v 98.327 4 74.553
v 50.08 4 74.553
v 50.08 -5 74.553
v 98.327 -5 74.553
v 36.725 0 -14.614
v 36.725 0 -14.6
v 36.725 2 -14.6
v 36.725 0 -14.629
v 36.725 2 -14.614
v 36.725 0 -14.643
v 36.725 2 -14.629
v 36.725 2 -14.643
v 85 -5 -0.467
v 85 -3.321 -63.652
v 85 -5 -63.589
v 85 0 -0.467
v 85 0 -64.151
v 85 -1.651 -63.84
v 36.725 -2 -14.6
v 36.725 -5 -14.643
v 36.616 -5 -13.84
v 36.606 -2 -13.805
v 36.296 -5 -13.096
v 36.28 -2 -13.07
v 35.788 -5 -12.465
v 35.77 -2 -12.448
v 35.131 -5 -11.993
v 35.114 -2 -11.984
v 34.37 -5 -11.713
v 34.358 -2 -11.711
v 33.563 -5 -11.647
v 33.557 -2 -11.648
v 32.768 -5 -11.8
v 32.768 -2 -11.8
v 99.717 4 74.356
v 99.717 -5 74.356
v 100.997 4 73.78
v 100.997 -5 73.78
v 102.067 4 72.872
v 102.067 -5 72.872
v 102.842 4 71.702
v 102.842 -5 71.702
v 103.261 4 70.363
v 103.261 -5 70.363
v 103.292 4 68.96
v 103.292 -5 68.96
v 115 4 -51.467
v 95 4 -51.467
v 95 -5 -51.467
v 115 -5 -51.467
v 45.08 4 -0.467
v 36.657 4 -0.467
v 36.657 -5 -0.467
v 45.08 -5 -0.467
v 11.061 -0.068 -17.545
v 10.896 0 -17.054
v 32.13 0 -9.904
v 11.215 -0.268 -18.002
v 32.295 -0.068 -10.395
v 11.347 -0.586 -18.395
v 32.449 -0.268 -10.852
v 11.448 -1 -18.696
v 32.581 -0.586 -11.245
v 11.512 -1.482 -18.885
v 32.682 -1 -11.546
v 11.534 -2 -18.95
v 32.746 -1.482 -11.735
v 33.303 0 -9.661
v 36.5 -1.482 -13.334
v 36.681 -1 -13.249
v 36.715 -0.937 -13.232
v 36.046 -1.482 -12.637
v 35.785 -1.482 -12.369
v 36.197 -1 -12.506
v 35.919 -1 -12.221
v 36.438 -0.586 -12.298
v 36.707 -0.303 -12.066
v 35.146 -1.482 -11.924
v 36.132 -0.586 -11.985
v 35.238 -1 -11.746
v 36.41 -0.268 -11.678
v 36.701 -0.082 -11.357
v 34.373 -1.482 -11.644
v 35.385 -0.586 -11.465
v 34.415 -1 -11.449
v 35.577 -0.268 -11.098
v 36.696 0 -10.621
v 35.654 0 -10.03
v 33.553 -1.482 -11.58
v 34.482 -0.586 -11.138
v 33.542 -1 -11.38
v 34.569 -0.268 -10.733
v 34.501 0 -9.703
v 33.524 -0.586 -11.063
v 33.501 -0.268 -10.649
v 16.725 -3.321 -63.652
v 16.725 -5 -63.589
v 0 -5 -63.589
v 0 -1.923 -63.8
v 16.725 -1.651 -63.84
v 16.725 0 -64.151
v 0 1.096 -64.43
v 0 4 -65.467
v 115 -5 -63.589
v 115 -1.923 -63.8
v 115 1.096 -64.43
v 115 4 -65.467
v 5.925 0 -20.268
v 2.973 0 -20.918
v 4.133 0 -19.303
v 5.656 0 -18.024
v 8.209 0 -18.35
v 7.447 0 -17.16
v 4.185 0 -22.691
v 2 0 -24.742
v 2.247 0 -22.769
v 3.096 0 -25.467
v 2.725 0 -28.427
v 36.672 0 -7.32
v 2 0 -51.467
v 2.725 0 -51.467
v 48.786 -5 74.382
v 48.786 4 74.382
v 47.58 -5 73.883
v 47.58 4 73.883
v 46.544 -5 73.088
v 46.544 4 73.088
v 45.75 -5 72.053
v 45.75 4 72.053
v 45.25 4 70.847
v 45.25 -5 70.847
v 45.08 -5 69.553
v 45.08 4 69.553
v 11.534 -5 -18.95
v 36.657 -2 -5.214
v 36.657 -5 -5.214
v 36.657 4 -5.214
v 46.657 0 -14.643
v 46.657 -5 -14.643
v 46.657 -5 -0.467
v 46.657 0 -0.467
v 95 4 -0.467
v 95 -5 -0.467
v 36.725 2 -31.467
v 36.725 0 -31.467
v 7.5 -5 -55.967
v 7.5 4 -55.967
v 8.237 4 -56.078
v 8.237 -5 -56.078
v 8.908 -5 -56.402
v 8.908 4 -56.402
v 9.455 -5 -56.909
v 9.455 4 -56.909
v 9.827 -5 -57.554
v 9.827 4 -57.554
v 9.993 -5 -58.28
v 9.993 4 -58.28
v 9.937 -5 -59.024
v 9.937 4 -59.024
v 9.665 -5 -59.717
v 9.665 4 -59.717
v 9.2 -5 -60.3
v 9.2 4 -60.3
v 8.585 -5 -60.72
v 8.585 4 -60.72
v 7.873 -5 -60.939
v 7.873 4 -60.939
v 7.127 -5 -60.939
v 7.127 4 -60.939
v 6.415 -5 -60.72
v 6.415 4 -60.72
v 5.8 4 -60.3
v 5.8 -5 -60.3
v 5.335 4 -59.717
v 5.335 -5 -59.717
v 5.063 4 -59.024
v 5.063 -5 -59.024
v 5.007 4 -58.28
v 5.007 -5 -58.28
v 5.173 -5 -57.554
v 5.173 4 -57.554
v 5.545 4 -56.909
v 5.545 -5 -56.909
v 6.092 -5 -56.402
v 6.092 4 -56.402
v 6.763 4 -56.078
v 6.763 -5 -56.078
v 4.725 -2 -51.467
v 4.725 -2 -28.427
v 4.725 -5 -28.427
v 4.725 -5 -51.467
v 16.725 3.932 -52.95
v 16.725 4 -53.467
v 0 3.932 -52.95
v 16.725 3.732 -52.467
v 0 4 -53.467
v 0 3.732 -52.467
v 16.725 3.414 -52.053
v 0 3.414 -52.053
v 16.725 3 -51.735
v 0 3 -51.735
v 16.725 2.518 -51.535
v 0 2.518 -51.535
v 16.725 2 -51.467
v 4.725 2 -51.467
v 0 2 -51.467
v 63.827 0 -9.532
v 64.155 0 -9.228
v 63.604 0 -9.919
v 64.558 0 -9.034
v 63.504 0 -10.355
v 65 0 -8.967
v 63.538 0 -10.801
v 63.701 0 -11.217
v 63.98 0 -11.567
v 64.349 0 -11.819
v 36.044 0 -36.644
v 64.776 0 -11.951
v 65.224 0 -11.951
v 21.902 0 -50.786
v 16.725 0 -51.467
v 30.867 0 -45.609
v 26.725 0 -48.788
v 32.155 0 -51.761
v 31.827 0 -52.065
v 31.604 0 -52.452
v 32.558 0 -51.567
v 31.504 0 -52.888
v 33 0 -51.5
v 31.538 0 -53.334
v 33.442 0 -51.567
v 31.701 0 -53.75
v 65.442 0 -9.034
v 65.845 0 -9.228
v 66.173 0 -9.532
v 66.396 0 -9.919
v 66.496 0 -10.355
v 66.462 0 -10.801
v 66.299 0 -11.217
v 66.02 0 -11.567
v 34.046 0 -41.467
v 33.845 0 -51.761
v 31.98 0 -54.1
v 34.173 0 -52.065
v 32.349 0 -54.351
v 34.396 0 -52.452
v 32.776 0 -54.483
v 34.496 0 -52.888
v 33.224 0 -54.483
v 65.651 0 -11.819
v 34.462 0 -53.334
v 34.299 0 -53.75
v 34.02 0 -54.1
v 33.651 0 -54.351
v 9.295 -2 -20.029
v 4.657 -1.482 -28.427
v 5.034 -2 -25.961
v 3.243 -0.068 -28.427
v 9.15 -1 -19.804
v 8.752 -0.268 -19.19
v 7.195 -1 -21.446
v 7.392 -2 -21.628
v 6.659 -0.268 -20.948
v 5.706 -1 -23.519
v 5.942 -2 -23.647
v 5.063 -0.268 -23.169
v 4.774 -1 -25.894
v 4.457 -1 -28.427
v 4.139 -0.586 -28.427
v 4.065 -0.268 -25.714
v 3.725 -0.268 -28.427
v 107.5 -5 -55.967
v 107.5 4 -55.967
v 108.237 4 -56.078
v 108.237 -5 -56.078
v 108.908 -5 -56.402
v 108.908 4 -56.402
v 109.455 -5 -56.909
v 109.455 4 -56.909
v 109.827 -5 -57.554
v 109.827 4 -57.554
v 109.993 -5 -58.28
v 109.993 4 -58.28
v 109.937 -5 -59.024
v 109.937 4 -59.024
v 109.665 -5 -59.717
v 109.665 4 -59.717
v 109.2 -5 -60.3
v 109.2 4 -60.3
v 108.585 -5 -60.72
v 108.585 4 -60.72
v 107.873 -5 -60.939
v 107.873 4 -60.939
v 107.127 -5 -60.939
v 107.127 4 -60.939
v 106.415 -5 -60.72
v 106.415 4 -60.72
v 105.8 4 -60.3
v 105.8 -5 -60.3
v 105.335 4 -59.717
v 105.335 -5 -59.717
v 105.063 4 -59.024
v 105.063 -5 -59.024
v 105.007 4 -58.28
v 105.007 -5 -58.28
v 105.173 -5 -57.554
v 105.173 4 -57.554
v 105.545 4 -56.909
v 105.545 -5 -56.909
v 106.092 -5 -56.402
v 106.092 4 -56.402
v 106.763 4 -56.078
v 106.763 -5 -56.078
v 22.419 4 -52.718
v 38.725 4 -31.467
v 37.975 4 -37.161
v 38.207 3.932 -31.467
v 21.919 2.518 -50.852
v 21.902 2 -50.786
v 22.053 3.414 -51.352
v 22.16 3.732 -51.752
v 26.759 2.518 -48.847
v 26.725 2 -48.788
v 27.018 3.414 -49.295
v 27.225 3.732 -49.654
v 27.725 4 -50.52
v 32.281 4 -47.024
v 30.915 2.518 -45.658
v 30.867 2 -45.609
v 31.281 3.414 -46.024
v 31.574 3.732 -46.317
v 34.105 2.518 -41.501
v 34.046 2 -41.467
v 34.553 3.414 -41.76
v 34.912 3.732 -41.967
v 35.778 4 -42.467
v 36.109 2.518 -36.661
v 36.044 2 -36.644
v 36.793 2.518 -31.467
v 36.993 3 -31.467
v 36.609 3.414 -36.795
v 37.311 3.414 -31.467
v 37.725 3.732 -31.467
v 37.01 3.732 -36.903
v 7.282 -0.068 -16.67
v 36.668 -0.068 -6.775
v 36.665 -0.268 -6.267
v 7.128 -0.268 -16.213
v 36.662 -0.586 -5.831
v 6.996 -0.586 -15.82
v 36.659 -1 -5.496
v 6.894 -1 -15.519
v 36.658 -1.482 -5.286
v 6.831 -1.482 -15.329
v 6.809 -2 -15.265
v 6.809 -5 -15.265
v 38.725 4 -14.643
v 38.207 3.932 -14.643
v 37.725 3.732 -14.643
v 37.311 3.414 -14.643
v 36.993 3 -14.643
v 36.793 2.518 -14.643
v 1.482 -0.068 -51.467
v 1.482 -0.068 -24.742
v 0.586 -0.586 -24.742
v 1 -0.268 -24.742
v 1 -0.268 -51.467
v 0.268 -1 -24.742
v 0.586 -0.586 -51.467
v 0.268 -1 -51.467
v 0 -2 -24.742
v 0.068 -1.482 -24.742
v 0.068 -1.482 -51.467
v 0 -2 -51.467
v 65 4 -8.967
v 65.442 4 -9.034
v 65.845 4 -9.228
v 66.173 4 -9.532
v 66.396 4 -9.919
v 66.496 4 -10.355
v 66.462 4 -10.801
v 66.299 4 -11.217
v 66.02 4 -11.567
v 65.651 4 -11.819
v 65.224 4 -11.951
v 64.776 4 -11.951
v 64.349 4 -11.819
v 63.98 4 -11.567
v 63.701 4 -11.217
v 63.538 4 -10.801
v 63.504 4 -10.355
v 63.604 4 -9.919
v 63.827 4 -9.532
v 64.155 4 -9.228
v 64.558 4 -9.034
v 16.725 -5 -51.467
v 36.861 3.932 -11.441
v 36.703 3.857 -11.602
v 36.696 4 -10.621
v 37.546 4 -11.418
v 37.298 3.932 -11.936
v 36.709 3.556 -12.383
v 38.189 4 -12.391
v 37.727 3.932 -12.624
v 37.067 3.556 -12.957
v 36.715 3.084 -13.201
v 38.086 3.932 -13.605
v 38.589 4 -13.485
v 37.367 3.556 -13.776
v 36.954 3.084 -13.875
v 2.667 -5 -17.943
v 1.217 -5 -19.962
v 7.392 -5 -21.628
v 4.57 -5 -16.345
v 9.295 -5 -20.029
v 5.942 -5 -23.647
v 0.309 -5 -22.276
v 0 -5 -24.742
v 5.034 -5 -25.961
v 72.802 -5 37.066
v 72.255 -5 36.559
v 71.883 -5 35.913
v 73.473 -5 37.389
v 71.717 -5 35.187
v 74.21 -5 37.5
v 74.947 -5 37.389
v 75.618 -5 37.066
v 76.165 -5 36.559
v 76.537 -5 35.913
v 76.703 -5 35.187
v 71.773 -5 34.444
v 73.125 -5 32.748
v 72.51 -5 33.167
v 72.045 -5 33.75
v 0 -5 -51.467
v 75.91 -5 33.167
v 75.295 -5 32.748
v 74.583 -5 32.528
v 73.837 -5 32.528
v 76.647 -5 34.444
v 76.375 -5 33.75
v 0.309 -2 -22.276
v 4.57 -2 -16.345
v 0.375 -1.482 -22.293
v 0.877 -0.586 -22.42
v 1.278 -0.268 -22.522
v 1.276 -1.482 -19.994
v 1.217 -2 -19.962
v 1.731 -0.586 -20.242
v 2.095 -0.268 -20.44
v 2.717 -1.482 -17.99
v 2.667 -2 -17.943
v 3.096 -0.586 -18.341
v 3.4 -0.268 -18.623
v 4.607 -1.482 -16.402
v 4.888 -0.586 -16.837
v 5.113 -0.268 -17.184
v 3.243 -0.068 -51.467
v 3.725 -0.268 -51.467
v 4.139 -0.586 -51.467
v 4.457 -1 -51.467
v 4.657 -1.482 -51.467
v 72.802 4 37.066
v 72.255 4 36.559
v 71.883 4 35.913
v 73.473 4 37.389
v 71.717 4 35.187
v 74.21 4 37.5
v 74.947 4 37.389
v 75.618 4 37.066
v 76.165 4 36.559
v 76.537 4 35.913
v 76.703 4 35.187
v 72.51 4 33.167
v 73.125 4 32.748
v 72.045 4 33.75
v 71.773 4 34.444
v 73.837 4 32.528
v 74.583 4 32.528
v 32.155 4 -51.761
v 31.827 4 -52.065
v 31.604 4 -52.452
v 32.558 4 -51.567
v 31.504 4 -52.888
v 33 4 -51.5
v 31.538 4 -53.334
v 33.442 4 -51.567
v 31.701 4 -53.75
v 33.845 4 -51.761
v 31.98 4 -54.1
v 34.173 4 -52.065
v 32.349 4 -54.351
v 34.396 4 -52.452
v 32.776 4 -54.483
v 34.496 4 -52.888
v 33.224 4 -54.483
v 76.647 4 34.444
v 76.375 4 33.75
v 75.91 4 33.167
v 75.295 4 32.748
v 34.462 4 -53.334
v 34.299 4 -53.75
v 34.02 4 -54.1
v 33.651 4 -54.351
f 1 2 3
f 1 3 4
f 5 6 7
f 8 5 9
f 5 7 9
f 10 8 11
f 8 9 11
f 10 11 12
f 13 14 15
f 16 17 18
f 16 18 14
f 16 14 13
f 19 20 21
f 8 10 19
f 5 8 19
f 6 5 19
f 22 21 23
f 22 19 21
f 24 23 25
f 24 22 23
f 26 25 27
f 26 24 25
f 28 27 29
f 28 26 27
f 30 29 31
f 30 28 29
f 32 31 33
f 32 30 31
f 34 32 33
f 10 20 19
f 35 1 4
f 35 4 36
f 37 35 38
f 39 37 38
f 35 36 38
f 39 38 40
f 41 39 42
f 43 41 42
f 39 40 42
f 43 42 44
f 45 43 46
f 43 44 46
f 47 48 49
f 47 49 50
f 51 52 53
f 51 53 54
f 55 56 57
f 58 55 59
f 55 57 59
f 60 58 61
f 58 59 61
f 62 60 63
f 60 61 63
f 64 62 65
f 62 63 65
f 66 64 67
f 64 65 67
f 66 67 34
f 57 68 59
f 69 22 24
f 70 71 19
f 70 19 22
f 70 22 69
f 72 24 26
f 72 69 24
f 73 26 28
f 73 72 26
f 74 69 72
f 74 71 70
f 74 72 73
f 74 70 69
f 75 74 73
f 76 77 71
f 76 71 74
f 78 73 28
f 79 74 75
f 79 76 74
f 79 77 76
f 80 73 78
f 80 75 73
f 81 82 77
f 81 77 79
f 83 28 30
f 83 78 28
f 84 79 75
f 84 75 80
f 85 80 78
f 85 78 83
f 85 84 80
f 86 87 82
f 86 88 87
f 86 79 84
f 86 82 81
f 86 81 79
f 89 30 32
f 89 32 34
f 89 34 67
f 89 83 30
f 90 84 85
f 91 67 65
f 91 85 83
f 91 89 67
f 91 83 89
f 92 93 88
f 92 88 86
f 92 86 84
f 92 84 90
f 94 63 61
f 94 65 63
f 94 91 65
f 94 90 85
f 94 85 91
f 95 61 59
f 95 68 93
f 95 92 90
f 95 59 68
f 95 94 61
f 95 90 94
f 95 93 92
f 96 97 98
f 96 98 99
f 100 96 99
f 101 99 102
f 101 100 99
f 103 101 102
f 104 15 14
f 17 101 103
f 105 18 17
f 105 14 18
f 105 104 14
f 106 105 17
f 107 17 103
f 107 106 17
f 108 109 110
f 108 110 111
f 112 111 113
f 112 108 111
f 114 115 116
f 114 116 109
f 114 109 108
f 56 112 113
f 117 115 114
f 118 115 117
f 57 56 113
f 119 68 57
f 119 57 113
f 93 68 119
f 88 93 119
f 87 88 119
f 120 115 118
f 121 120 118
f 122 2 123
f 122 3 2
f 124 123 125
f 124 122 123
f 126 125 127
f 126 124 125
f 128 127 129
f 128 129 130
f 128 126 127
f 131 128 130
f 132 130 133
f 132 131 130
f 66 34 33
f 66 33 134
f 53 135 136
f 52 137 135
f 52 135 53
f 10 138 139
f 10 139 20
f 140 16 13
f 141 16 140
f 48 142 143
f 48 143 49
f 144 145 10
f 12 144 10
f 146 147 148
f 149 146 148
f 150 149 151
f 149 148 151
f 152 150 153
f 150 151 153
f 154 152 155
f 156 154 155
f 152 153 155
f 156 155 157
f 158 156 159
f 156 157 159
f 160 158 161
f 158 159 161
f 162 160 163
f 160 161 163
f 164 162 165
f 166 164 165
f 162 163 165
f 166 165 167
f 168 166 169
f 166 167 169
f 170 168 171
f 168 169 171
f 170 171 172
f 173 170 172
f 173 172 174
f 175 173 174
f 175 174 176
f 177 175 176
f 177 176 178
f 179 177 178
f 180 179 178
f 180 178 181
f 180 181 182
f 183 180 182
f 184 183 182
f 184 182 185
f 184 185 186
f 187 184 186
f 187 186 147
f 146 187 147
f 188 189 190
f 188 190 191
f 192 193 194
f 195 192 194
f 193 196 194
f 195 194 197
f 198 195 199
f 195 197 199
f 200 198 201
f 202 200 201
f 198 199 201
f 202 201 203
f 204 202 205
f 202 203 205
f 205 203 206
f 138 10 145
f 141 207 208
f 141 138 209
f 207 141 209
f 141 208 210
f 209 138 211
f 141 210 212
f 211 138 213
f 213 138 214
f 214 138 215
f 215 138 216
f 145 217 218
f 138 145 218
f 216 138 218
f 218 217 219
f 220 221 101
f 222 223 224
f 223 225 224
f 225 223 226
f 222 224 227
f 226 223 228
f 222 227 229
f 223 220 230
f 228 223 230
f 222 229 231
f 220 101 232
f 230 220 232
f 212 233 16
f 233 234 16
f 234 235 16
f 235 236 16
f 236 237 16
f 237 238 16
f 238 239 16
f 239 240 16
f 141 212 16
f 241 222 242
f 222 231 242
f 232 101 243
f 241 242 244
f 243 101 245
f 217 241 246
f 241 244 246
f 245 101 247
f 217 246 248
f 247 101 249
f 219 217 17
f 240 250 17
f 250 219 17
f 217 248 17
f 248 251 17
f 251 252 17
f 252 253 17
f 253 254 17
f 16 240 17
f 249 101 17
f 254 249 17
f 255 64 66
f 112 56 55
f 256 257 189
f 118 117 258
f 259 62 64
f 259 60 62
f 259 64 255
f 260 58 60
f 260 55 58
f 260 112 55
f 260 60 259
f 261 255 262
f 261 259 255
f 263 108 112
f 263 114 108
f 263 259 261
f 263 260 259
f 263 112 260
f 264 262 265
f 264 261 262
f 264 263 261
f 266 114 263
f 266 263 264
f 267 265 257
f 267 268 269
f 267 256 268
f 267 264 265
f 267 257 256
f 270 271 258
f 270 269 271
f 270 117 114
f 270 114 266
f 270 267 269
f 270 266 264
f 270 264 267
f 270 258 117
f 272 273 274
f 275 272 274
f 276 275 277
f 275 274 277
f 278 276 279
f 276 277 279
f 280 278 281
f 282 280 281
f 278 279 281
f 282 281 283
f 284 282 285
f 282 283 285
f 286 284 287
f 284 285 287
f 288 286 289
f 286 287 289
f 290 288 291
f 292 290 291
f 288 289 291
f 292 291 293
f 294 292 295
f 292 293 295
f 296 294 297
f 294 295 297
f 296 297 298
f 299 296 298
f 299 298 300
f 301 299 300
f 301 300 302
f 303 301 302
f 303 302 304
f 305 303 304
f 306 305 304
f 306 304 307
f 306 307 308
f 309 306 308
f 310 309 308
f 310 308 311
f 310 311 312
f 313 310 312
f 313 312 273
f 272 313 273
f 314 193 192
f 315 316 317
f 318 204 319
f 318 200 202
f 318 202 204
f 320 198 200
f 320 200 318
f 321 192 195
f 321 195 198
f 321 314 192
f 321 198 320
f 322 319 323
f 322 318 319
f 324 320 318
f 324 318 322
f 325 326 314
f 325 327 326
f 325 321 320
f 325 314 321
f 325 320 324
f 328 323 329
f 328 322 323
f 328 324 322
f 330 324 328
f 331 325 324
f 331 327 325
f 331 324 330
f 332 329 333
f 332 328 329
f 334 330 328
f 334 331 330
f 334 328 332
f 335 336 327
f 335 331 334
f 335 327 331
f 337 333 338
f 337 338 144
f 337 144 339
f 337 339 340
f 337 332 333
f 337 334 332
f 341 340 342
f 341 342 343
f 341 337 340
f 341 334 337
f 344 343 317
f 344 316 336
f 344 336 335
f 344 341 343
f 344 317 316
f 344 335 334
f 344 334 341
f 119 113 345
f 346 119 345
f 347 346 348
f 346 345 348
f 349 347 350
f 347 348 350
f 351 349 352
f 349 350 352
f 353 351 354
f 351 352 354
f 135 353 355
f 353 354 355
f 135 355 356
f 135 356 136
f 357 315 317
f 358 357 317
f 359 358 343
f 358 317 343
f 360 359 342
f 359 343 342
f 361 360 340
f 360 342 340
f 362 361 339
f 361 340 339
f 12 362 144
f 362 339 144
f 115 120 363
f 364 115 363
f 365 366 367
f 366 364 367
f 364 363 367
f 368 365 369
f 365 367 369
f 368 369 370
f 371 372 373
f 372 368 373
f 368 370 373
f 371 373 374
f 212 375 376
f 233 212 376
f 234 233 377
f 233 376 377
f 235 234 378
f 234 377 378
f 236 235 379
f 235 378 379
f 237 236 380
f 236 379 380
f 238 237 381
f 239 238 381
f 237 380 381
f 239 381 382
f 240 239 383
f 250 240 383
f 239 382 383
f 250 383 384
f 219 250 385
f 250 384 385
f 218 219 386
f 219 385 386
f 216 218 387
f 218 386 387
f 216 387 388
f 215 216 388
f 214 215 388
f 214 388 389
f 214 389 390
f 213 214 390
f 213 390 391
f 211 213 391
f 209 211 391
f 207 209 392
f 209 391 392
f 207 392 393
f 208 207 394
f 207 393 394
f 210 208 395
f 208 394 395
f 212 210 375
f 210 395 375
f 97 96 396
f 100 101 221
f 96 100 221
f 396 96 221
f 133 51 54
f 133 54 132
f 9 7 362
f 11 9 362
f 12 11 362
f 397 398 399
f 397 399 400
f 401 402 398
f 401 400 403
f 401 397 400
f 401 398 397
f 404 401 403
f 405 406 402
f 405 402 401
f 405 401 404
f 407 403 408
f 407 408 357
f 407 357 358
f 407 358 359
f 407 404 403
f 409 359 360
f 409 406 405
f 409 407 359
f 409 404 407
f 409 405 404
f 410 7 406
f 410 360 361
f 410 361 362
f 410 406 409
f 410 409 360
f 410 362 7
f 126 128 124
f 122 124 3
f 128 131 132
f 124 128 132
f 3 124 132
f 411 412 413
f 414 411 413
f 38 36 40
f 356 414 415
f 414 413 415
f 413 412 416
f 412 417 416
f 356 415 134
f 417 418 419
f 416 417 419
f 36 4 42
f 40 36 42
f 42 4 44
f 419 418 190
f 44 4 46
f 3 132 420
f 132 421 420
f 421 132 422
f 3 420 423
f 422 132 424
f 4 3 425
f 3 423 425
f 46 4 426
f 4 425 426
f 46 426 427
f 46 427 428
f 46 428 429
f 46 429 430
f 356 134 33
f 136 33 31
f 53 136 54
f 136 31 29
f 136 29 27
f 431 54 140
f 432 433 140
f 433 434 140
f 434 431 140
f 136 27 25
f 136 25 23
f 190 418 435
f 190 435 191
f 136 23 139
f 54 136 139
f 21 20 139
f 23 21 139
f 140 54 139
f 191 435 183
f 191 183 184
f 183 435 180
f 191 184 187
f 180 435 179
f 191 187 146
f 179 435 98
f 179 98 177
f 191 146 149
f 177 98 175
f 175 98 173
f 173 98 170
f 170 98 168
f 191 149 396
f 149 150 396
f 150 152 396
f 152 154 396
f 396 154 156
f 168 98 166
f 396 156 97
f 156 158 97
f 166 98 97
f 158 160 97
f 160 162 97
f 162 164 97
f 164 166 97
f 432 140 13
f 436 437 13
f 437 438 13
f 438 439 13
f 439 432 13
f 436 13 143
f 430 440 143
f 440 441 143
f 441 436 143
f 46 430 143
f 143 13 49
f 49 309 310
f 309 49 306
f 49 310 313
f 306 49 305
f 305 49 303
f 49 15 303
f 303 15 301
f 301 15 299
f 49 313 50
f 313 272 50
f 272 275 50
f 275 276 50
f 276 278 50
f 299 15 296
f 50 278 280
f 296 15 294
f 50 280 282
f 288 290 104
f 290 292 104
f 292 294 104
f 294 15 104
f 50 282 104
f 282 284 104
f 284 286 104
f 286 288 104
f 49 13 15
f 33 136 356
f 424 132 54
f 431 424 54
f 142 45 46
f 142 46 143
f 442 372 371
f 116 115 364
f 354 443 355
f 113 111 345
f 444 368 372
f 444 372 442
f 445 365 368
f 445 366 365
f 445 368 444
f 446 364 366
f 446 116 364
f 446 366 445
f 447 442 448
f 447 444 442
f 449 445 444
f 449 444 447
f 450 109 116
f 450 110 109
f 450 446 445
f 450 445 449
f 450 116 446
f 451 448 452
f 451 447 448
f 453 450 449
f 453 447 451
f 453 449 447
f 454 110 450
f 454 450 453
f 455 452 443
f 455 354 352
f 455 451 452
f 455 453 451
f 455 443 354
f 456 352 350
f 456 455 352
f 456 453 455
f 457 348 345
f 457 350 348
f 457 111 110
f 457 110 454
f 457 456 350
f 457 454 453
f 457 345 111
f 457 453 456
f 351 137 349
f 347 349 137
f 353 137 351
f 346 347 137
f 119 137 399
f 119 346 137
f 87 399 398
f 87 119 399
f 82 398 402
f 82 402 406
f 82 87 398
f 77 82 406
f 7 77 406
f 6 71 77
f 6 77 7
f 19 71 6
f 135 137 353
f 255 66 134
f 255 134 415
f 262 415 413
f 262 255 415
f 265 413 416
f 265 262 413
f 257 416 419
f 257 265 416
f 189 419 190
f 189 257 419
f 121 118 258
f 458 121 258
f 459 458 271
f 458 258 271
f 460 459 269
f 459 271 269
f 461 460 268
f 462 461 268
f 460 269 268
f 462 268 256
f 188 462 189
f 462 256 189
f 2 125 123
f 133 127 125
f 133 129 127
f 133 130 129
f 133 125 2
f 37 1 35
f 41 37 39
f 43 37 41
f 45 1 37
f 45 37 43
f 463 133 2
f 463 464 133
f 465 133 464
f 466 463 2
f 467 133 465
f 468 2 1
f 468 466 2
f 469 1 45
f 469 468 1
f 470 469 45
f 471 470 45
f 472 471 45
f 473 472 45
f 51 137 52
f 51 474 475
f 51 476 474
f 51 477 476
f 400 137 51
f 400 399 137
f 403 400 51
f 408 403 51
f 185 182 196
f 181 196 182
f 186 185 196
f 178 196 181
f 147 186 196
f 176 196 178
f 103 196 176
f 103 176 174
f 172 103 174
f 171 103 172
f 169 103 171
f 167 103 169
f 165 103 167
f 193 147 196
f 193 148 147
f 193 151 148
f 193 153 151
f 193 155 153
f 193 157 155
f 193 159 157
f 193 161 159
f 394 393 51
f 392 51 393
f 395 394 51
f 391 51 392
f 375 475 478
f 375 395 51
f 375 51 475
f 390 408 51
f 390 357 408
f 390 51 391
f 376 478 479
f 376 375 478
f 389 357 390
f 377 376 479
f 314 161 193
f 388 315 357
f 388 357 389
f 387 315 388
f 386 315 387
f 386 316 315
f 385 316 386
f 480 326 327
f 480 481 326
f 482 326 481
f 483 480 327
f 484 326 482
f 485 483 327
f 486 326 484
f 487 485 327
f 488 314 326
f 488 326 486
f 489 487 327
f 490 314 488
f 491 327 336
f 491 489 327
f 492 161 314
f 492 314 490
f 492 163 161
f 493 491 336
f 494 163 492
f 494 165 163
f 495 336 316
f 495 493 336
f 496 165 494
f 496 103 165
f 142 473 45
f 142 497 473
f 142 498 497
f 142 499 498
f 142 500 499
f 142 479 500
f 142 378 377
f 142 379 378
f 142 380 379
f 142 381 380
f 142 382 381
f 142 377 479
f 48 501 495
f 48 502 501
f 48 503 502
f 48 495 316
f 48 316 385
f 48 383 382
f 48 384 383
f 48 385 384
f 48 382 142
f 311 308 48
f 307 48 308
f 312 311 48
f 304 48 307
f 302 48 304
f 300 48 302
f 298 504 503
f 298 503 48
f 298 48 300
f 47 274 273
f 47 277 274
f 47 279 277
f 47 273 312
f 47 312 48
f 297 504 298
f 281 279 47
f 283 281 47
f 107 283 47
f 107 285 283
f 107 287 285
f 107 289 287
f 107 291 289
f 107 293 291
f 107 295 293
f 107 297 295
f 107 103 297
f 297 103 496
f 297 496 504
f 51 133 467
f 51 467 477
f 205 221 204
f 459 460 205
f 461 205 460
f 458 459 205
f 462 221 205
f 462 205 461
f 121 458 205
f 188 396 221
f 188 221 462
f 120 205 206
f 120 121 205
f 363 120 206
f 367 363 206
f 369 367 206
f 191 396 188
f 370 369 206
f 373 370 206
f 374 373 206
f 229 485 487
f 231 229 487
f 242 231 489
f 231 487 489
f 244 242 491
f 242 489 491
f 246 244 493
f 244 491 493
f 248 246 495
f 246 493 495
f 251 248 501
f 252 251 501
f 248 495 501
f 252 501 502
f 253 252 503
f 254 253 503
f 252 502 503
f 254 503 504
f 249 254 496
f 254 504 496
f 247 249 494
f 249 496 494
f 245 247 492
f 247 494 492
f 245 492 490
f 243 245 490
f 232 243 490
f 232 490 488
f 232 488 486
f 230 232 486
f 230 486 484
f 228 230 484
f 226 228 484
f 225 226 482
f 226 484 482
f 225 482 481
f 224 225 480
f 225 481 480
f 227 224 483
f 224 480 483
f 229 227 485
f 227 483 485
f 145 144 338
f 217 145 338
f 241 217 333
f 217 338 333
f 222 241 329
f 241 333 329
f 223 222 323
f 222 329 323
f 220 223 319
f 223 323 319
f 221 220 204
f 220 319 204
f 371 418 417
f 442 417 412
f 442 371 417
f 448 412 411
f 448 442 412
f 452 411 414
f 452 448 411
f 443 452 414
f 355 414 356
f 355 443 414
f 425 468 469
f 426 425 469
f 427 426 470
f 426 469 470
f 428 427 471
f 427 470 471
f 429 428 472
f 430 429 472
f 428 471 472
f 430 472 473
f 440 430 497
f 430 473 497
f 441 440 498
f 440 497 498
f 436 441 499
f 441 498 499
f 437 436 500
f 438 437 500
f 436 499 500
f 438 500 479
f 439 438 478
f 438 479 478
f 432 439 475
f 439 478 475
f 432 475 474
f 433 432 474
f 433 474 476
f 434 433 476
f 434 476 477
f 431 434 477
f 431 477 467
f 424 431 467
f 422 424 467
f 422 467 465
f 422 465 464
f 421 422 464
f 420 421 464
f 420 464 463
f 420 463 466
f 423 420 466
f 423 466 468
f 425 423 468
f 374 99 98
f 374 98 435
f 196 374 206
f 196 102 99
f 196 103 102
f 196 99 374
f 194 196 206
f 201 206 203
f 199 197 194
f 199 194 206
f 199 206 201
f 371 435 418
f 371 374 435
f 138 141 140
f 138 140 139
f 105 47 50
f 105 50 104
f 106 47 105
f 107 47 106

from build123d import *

# Parameters (mm, degrees)
SALIENTE_EXTRUIR1_DEPTH      = 4
REDONDEO1_R                  = 20
REDONDEO2_R                  = 10
REDONDEO3_R                  = 3
CROQUIS2_R                   = 1.5
CORTAR_EXTRUIR1_DEPTH        = 4
SALIENTE_EXTRUIR2_DEPTH      = 5
SALIENTE_EXTRUIR2_DEPTH_BACK = 4
CROQUIS4_W                   = 16.725121099
CROQUIS4_H                   = 14
SALIENTE_EXTRUIR3_DEPTH      = 5
SALIENTE_EXTRUIR4_DEPTH      = 5
CORTAR_EXTRUIR2_START        = -4
CORTAR_EXTRUIR2_DEPTH        = 4
SALIENTE_EXTRUIR5_DEPTH      = 9
REDONDEO4_R                  = 5
CORTAR_EXTRUIR3_DEPTH        = 115
CROQUIS10_R                  = 2.5
CORTAR_EXTRUIR4_DEPTH        = 10
REDONDEO5_R                  = 2


with BuildPart() as part:
    # Croquis1 → Saliente-Extruir1 (new body)
    with BuildSketch(Plane(origin=(0, 0, 0), x_dir=(1, 0, 0), z_dir=(0, 1, 0))):
        Polygon((36.657146199, 0.467319271), (95, 0.467319271), (95, 65.467319271), (0, 65.467319271), (0, 17.557539605), (36.657146199, 5.214366653), align=None)
        Polygon((4.725121099, 51.467319271), (36.725121099, 51.467319271), (36.725121099, 10.467319271), (4.725121099, 21.242340663), align=None, mode=Mode.SUBTRACT)
    extrude(amount=SALIENTE_EXTRUIR1_DEPTH)

    # Redondeo1
    redondeo1_edges = [part.edges().sort_by_distance(p)[0] for p in [
        (36.725121099, 2, -51.467319271),
    ]]
    fillet(redondeo1_edges, radius=REDONDEO1_R)

    # Redondeo2
    redondeo2_edges = [part.edges().sort_by_distance(p)[0] for p in [
        (0, 2, -17.557539605),
        (4.725121099, 2, -21.242340663),
    ]]
    fillet(redondeo2_edges, radius=REDONDEO2_R)

    # Redondeo3
    redondeo3_edges = [part.edges().sort_by_distance(p)[0] for p in [
        (36.725121099, 2, -10.467319271),
    ]]
    fillet(redondeo3_edges, radius=REDONDEO3_R)

    # Croquis2 → Cortar-Extruir1 (cut)
    with BuildSketch(Plane(origin=(0, 4, 0), x_dir=(1, 0, 0), z_dir=(0, 1, 0))):
        with Locations(Location((33, 53, 0), (0, 0, 270))):
            Circle(CROQUIS2_R)
        with Locations(Location((65, 10.467319271, 0), (0, 0, 270))):
            Circle(CROQUIS2_R)
    extrude(amount=-CORTAR_EXTRUIR1_DEPTH, mode=Mode.SUBTRACT)

    # Croquis3 → Saliente-Extruir2 (add, two sides: drawn at the far end of the back side and taken through both)
    with BuildSketch(Plane.XZ.offset(-SALIENTE_EXTRUIR2_DEPTH_BACK)):
        Polygon((95, -0.467319271), (95, -51.467319271), (115, -51.467319271), (115, -65.467319271), (85, -65.467319271), (85, -0.467319271), align=None)
    extrude(amount=SALIENTE_EXTRUIR2_DEPTH + SALIENTE_EXTRUIR2_DEPTH_BACK)

    # Croquis4 → Saliente-Extruir3 (add)
    with BuildSketch(Plane.XZ):
        with Locations((8.36256055, -58.467319271)):
            Rectangle(CROQUIS4_W, CROQUIS4_H)
    extrude(amount=SALIENTE_EXTRUIR3_DEPTH)

    # Croquis5 → Saliente-Extruir4 (add)
    with BuildSketch(Plane.XZ):
        with BuildLine():
            Line((6.808855565, -15.264865719), (36.657146199, -5.214366653))
            Line((36.657146199, -5.214366653), (36.657146199, -0.467319271))
            Line((36.657146199, -0.467319271), (46.657146199, -0.467319271))
            Line((46.657146199, -0.467319271), (46.657146199, -14.642982178))
            Line((46.657146199, -14.642982178), (36.725121099, -14.642982178))
            ThreePointArc((36.725121099, -14.642982178), (35.475545335, -12.206588327), (32.767777769, -11.799833616))
            Line((32.767777769, -11.799833616), (11.533976664, -18.949666776))
            ThreePointArc((11.533976664, -18.949666776), (6.603808263, -22.592081199), (4.725121099, -28.426828651))
            Line((4.725121099, -28.426828651), (4.725121099, -51.467319271))
            Line((4.725121099, -51.467319271), (0, -51.467319271))
            Line((0, -51.467319271), (0, -24.742027593))
            ThreePointArc((0, -24.742027593), (1.878687164, -18.907280142), (6.808855565, -15.264865719))
        make_face()
    extrude(amount=SALIENTE_EXTRUIR4_DEPTH)

    # Cortar-Extruir2: read off the stored shape, not the designer's step
    # Cortar-Extruir2 outline → Cortar-Extruir2 (cut)
    with BuildSketch(Plane(origin=(0, 4, 0), x_dir=(1, 0, 0), z_dir=(0, 1, 0)).offset(CORTAR_EXTRUIR2_START)):
        with BuildLine():
            Line((4.725121099, 51.467319271), (0, 51.467319271))
            Line((0, 51.467319271), (0, 24.742027593))
            ThreePointArc((0, 24.742027593), (1.878687164, 18.907280142), (6.808855565, 15.264865719))
            Line((6.808855565, 15.264865719), (36.657146199, 5.214366653))
            Line((36.657146199, 5.214366653), (36.72480926, 14.599727874))
            ThreePointArc((36.72480926, 14.599727874), (35.457935304, 12.194032416), (32.767777769, 11.799833616))
            Line((32.767777769, 11.799833616), (11.533976664, 18.949666776))
            ThreePointArc((11.533976664, 18.949666776), (6.603808263, 22.592081199), (4.725121099, 28.426828651))
            Line((4.725121099, 28.426828651), (4.725121099, 51.467319271))
        make_face()
    extrude(amount=CORTAR_EXTRUIR2_DEPTH, mode=Mode.SUBTRACT)

    # Croquis8 → Saliente-Extruir5 (add)
    with BuildSketch(Plane(origin=(0, 4, 0), x_dir=(1, 0, 0), z_dir=(0, 1, 0))):
        Polygon((45.08, -74.552680729), (103.96, -74.552680729), (95, 0.467319271), (45.08, 0.467319271), align=None)
    extrude(amount=-SALIENTE_EXTRUIR5_DEPTH)

    # Redondeo4
    redondeo4_edges = [part.edges().sort_by_distance(p)[0] for p in [
        (45.08, -0.5, 74.552680729),
        (103.96, -0.5, 74.552680729),
    ]]
    fillet(redondeo4_edges, radius=REDONDEO4_R)

    # Croquis9 → Cortar-Extruir3 (cut)
    with BuildSketch(Plane(origin=(115, 0, 0), x_dir=(0, 0, -1), z_dir=(1, 0, 0))):
        with BuildLine():
            Line((65.467319271, 4), (65.467319271, -5))
            Line((65.467319271, -5), (63.588909898, -5))
            ThreePointArc((63.588909898, -5), (64.063517857, -0.403033017), (65.467319271, 4))
        make_face()
    extrude(amount=-CORTAR_EXTRUIR3_DEPTH, mode=Mode.SUBTRACT)

    # Croquis10 → Cortar-Extruir4 (cut)
    with BuildSketch(Plane(origin=(0, 4, 0), x_dir=(1, 0, 0), z_dir=(0, 1, 0))):
        with Locations(Location((7.5, 58.467319271, 0), (0, 0, 270))):
            Circle(CROQUIS10_R)
        with Locations(Location((107.5, 58.467319271, 0), (0, 0, 270))):
            Circle(CROQUIS10_R)
        with Locations(Location((74.21, -35, 0), (0, 0, 270))):
            Circle(CROQUIS10_R)
    extrude(amount=-CORTAR_EXTRUIR4_DEPTH, mode=Mode.SUBTRACT)

    # Redondeo5
    # the kernel refuses this fillet: 2 mm, written as the material it takes off along each edge
    with BuildSketch(Plane(origin=(6.808855565, 0, -15.264865719), x_dir=(-3.003248393768829e-11, -1.0, 8.919142254990751e-11), z_dir=(0.9477161874303269, 0, 0.31911444355046886))) as redondeo5_piece_1_section:
        with BuildLine():
            CenterArc((REDONDEO5_R, REDONDEO5_R), REDONDEO5_R, 180.000000005, 90)
            Line((-REDONDEO5_R * 9.41119543218e-11, REDONDEO5_R), (0, 0))
            Line((0, 0), (REDONDEO5_R, 0))
        make_face()
    redondeo5_piece_1 = extrude(amount=36.494967618, mode=Mode.PRIVATE)
    redondeo5_piece_1 = split(redondeo5_piece_1, bisect_by=Plane(origin=(36.728049447, 0, -15.049165525), z_dir=(-0.9999740131061556, 0, -0.007209237988178882)), keep=Keep.TOP, mode=Mode.PRIVATE)
    add(redondeo5_piece_1, mode=Mode.SUBTRACT)
    with BuildSketch(Plane(origin=(9.999999999, 0, -24.742027593), x_dir=(-1.0, 0, 6.147260478780798e-12), z_dir=(-6.147260478780798e-12, 0, -1.0))) as redondeo5_piece_2:
        with BuildLine():
            CenterArc((9.999999999 - REDONDEO5_R, -REDONDEO5_R), REDONDEO5_R, 0, 90)
            Line((9.999999999 + REDONDEO5_R * 5.85513859619e-11, -REDONDEO5_R), (9.999999999, 0))
            Line((9.999999999, 0), (9.999999999 - REDONDEO5_R, 0))
        make_face()
    revolve(axis=Axis((9.999999999, 0, -24.742027593), (0, 1, 0)), revolution_arc=71.390621361, mode=Mode.SUBTRACT)
    with BuildSketch(Plane(origin=(0, 0, -51.467319271), x_dir=(0, -1, 0), z_dir=(0, 0, 1))) as redondeo5_piece_3:
        with BuildLine():
            CenterArc((REDONDEO5_R, REDONDEO5_R), REDONDEO5_R, 180, 90)
            Line((0, REDONDEO5_R), (0, 0))
            Line((0, 0), (REDONDEO5_R, 0))
        make_face()
    extrude(amount=26.725291678, mode=Mode.SUBTRACT)
    with BuildSketch(Plane(origin=(4.725121099, 0, -28.426828651), x_dir=(-1, 0, 0), z_dir=(0, 0, -1))) as redondeo5_piece_4:
        with BuildLine():
            CenterArc((REDONDEO5_R, -REDONDEO5_R), REDONDEO5_R, 90, 90)
            Line((-REDONDEO5_R * 1.16604059741e-10, -REDONDEO5_R), (0, 0))
            Line((0, 0), (REDONDEO5_R, 0))
        make_face()
    extrude(amount=23.04049062, mode=Mode.SUBTRACT)
    with BuildSketch(Plane(origin=(14.725121098, 0, -28.42682865), x_dir=(-0.3191144434609787, 0, 0.94771618746046), z_dir=(0.94771618746046, 0, 0.3191144434609787))) as redondeo5_piece_5:
        with BuildLine():
            CenterArc((9.999999999 + REDONDEO5_R, REDONDEO5_R), REDONDEO5_R, 180, 90)
            Line((9.999999999 - REDONDEO5_R * 2.13431938789e-10, REDONDEO5_R), (9.999999999, 0))
            Line((9.999999999, 0), (9.999999999 + REDONDEO5_R, 0))
        make_face()
    revolve(axis=Axis((14.725121098, 0, -28.42682865), (0, -1, 0)), revolution_arc=71.390621366, mode=Mode.SUBTRACT)
    with BuildSketch(Plane(origin=(32.767777769, 0, -11.799833616), x_dir=(-0.3191144435113306, 0, 0.9477161874435055), z_dir=(-0.9477161874435056, 0, -0.3191144435113306))) as redondeo5_piece_6:
        with BuildLine():
            CenterArc((REDONDEO5_R, -REDONDEO5_R), REDONDEO5_R, 90, 90)
            Line((0, -REDONDEO5_R), (0, 0))
            Line((0, 0), (REDONDEO5_R, 0))
        make_face()
    extrude(amount=22.405232058, mode=Mode.SUBTRACT)
    with BuildSketch(Plane(origin=(33.725121101, 0, -14.642982175), x_dir=(-0.08231883672192833, 0, -0.996606045095427), z_dir=(-0.996606045095427, 0, 0.08231883672192833))) as redondeo5_piece_7_section:
        with BuildLine():
            CenterArc((2.999999998 + REDONDEO5_R, REDONDEO5_R), REDONDEO5_R, 180, 90)
            Line((2.999999998 + REDONDEO5_R, 0), (2.999999998, 0))
            Line((2.999999998, 0), (2.999999998 - REDONDEO5_R * 4.36447322727e-10, REDONDEO5_R))
        make_face()
    redondeo5_piece_7 = revolve(axis=Axis((33.725121101, 0, -14.642982175), (0, -1, 0)), revolution_arc=203.331243748, mode=Mode.PRIVATE)
    redondeo5_piece_7 = split(redondeo5_piece_7, bisect_by=Plane(origin=(36.724965179, 0, -14.621355023), z_dir=(-0.9999740131061556, 0, -0.007209237988178882)), keep=Keep.TOP, mode=Mode.PRIVATE)
    add(redondeo5_piece_7, mode=Mode.SUBTRACT)
    with BuildSketch(Plane(origin=(4.725121099, 4, -51.467319271), x_dir=(0, 0, -1), z_dir=(1, 0, 0))) as redondeo5_piece_8:
        with BuildLine():
            CenterArc((REDONDEO5_R, -REDONDEO5_R), REDONDEO5_R, 90, 90)
            Line((0, -REDONDEO5_R), (0, 0))
            Line((0, 0), (REDONDEO5_R, 0))
        make_face()
    extrude(amount=12, mode=Mode.SUBTRACT)
    with BuildSketch(Plane(origin=(16.725121099, 4, -31.467319271), x_dir=(0, 0, -1), z_dir=(-1, 0, 0))) as redondeo5_piece_9:
        with BuildLine():
            CenterArc((20 + REDONDEO5_R, REDONDEO5_R), REDONDEO5_R, 180, 90)
            Line((20, REDONDEO5_R), (20, 0))
            Line((20, 0), (20 + REDONDEO5_R, 0))
        make_face()
    revolve(axis=Axis((16.725121099, 4, -31.467319271), (0, -1, 0)), revolution_arc=90, mode=Mode.SUBTRACT)
    with BuildSketch(Plane(origin=(36.725121099, 4, -31.467319271), x_dir=(1, 0, 0), z_dir=(0, 0, 1))) as redondeo5_piece_10:
        with BuildLine():
            CenterArc((REDONDEO5_R, -REDONDEO5_R), REDONDEO5_R, 90, 90)
            Line((0, -REDONDEO5_R), (0, 0))
            Line((0, 0), (REDONDEO5_R, 0))
        make_face()
    extrude(amount=16.824337093, mode=Mode.SUBTRACT)
    with BuildSketch(Plane(origin=(33.725121099, 4, -14.642982178), x_dir=(-0.11006554678443577, 0, 0.9939243308275753), z_dir=(-0.9939243308275753, 0, -0.11006554678443577))) as redondeo5_piece_11:
        with BuildLine():
            CenterArc((3 + REDONDEO5_R, -REDONDEO5_R), REDONDEO5_R, 90, 90)
            Line((3, -REDONDEO5_R), (3, 0))
            Line((3, 0), (3 + REDONDEO5_R, 0))
        make_face()
    revolve(axis=Axis((33.725121099, 4, -14.642982178), (0, 1, 0)), revolution_arc=96.319094067, mode=Mode.SUBTRACT)
    with BuildSketch(Plane(origin=(4.725121099, 4, -51.467319271), x_dir=(0, 0, -1), z_dir=(-1, 0, 0))) as redondeo5_piece_12:
        with BuildLine():
            CenterArc((REDONDEO5_R, REDONDEO5_R), REDONDEO5_R, 180, 90)
            Line((-REDONDEO5_R * 1.79170456249e-10, REDONDEO5_R), (0, 0))
            Line((0, 0), (REDONDEO5_R, 0))
        make_face()
    extrude(amount=9.725121099, mode=Mode.SUBTRACT)


solid = part.part
